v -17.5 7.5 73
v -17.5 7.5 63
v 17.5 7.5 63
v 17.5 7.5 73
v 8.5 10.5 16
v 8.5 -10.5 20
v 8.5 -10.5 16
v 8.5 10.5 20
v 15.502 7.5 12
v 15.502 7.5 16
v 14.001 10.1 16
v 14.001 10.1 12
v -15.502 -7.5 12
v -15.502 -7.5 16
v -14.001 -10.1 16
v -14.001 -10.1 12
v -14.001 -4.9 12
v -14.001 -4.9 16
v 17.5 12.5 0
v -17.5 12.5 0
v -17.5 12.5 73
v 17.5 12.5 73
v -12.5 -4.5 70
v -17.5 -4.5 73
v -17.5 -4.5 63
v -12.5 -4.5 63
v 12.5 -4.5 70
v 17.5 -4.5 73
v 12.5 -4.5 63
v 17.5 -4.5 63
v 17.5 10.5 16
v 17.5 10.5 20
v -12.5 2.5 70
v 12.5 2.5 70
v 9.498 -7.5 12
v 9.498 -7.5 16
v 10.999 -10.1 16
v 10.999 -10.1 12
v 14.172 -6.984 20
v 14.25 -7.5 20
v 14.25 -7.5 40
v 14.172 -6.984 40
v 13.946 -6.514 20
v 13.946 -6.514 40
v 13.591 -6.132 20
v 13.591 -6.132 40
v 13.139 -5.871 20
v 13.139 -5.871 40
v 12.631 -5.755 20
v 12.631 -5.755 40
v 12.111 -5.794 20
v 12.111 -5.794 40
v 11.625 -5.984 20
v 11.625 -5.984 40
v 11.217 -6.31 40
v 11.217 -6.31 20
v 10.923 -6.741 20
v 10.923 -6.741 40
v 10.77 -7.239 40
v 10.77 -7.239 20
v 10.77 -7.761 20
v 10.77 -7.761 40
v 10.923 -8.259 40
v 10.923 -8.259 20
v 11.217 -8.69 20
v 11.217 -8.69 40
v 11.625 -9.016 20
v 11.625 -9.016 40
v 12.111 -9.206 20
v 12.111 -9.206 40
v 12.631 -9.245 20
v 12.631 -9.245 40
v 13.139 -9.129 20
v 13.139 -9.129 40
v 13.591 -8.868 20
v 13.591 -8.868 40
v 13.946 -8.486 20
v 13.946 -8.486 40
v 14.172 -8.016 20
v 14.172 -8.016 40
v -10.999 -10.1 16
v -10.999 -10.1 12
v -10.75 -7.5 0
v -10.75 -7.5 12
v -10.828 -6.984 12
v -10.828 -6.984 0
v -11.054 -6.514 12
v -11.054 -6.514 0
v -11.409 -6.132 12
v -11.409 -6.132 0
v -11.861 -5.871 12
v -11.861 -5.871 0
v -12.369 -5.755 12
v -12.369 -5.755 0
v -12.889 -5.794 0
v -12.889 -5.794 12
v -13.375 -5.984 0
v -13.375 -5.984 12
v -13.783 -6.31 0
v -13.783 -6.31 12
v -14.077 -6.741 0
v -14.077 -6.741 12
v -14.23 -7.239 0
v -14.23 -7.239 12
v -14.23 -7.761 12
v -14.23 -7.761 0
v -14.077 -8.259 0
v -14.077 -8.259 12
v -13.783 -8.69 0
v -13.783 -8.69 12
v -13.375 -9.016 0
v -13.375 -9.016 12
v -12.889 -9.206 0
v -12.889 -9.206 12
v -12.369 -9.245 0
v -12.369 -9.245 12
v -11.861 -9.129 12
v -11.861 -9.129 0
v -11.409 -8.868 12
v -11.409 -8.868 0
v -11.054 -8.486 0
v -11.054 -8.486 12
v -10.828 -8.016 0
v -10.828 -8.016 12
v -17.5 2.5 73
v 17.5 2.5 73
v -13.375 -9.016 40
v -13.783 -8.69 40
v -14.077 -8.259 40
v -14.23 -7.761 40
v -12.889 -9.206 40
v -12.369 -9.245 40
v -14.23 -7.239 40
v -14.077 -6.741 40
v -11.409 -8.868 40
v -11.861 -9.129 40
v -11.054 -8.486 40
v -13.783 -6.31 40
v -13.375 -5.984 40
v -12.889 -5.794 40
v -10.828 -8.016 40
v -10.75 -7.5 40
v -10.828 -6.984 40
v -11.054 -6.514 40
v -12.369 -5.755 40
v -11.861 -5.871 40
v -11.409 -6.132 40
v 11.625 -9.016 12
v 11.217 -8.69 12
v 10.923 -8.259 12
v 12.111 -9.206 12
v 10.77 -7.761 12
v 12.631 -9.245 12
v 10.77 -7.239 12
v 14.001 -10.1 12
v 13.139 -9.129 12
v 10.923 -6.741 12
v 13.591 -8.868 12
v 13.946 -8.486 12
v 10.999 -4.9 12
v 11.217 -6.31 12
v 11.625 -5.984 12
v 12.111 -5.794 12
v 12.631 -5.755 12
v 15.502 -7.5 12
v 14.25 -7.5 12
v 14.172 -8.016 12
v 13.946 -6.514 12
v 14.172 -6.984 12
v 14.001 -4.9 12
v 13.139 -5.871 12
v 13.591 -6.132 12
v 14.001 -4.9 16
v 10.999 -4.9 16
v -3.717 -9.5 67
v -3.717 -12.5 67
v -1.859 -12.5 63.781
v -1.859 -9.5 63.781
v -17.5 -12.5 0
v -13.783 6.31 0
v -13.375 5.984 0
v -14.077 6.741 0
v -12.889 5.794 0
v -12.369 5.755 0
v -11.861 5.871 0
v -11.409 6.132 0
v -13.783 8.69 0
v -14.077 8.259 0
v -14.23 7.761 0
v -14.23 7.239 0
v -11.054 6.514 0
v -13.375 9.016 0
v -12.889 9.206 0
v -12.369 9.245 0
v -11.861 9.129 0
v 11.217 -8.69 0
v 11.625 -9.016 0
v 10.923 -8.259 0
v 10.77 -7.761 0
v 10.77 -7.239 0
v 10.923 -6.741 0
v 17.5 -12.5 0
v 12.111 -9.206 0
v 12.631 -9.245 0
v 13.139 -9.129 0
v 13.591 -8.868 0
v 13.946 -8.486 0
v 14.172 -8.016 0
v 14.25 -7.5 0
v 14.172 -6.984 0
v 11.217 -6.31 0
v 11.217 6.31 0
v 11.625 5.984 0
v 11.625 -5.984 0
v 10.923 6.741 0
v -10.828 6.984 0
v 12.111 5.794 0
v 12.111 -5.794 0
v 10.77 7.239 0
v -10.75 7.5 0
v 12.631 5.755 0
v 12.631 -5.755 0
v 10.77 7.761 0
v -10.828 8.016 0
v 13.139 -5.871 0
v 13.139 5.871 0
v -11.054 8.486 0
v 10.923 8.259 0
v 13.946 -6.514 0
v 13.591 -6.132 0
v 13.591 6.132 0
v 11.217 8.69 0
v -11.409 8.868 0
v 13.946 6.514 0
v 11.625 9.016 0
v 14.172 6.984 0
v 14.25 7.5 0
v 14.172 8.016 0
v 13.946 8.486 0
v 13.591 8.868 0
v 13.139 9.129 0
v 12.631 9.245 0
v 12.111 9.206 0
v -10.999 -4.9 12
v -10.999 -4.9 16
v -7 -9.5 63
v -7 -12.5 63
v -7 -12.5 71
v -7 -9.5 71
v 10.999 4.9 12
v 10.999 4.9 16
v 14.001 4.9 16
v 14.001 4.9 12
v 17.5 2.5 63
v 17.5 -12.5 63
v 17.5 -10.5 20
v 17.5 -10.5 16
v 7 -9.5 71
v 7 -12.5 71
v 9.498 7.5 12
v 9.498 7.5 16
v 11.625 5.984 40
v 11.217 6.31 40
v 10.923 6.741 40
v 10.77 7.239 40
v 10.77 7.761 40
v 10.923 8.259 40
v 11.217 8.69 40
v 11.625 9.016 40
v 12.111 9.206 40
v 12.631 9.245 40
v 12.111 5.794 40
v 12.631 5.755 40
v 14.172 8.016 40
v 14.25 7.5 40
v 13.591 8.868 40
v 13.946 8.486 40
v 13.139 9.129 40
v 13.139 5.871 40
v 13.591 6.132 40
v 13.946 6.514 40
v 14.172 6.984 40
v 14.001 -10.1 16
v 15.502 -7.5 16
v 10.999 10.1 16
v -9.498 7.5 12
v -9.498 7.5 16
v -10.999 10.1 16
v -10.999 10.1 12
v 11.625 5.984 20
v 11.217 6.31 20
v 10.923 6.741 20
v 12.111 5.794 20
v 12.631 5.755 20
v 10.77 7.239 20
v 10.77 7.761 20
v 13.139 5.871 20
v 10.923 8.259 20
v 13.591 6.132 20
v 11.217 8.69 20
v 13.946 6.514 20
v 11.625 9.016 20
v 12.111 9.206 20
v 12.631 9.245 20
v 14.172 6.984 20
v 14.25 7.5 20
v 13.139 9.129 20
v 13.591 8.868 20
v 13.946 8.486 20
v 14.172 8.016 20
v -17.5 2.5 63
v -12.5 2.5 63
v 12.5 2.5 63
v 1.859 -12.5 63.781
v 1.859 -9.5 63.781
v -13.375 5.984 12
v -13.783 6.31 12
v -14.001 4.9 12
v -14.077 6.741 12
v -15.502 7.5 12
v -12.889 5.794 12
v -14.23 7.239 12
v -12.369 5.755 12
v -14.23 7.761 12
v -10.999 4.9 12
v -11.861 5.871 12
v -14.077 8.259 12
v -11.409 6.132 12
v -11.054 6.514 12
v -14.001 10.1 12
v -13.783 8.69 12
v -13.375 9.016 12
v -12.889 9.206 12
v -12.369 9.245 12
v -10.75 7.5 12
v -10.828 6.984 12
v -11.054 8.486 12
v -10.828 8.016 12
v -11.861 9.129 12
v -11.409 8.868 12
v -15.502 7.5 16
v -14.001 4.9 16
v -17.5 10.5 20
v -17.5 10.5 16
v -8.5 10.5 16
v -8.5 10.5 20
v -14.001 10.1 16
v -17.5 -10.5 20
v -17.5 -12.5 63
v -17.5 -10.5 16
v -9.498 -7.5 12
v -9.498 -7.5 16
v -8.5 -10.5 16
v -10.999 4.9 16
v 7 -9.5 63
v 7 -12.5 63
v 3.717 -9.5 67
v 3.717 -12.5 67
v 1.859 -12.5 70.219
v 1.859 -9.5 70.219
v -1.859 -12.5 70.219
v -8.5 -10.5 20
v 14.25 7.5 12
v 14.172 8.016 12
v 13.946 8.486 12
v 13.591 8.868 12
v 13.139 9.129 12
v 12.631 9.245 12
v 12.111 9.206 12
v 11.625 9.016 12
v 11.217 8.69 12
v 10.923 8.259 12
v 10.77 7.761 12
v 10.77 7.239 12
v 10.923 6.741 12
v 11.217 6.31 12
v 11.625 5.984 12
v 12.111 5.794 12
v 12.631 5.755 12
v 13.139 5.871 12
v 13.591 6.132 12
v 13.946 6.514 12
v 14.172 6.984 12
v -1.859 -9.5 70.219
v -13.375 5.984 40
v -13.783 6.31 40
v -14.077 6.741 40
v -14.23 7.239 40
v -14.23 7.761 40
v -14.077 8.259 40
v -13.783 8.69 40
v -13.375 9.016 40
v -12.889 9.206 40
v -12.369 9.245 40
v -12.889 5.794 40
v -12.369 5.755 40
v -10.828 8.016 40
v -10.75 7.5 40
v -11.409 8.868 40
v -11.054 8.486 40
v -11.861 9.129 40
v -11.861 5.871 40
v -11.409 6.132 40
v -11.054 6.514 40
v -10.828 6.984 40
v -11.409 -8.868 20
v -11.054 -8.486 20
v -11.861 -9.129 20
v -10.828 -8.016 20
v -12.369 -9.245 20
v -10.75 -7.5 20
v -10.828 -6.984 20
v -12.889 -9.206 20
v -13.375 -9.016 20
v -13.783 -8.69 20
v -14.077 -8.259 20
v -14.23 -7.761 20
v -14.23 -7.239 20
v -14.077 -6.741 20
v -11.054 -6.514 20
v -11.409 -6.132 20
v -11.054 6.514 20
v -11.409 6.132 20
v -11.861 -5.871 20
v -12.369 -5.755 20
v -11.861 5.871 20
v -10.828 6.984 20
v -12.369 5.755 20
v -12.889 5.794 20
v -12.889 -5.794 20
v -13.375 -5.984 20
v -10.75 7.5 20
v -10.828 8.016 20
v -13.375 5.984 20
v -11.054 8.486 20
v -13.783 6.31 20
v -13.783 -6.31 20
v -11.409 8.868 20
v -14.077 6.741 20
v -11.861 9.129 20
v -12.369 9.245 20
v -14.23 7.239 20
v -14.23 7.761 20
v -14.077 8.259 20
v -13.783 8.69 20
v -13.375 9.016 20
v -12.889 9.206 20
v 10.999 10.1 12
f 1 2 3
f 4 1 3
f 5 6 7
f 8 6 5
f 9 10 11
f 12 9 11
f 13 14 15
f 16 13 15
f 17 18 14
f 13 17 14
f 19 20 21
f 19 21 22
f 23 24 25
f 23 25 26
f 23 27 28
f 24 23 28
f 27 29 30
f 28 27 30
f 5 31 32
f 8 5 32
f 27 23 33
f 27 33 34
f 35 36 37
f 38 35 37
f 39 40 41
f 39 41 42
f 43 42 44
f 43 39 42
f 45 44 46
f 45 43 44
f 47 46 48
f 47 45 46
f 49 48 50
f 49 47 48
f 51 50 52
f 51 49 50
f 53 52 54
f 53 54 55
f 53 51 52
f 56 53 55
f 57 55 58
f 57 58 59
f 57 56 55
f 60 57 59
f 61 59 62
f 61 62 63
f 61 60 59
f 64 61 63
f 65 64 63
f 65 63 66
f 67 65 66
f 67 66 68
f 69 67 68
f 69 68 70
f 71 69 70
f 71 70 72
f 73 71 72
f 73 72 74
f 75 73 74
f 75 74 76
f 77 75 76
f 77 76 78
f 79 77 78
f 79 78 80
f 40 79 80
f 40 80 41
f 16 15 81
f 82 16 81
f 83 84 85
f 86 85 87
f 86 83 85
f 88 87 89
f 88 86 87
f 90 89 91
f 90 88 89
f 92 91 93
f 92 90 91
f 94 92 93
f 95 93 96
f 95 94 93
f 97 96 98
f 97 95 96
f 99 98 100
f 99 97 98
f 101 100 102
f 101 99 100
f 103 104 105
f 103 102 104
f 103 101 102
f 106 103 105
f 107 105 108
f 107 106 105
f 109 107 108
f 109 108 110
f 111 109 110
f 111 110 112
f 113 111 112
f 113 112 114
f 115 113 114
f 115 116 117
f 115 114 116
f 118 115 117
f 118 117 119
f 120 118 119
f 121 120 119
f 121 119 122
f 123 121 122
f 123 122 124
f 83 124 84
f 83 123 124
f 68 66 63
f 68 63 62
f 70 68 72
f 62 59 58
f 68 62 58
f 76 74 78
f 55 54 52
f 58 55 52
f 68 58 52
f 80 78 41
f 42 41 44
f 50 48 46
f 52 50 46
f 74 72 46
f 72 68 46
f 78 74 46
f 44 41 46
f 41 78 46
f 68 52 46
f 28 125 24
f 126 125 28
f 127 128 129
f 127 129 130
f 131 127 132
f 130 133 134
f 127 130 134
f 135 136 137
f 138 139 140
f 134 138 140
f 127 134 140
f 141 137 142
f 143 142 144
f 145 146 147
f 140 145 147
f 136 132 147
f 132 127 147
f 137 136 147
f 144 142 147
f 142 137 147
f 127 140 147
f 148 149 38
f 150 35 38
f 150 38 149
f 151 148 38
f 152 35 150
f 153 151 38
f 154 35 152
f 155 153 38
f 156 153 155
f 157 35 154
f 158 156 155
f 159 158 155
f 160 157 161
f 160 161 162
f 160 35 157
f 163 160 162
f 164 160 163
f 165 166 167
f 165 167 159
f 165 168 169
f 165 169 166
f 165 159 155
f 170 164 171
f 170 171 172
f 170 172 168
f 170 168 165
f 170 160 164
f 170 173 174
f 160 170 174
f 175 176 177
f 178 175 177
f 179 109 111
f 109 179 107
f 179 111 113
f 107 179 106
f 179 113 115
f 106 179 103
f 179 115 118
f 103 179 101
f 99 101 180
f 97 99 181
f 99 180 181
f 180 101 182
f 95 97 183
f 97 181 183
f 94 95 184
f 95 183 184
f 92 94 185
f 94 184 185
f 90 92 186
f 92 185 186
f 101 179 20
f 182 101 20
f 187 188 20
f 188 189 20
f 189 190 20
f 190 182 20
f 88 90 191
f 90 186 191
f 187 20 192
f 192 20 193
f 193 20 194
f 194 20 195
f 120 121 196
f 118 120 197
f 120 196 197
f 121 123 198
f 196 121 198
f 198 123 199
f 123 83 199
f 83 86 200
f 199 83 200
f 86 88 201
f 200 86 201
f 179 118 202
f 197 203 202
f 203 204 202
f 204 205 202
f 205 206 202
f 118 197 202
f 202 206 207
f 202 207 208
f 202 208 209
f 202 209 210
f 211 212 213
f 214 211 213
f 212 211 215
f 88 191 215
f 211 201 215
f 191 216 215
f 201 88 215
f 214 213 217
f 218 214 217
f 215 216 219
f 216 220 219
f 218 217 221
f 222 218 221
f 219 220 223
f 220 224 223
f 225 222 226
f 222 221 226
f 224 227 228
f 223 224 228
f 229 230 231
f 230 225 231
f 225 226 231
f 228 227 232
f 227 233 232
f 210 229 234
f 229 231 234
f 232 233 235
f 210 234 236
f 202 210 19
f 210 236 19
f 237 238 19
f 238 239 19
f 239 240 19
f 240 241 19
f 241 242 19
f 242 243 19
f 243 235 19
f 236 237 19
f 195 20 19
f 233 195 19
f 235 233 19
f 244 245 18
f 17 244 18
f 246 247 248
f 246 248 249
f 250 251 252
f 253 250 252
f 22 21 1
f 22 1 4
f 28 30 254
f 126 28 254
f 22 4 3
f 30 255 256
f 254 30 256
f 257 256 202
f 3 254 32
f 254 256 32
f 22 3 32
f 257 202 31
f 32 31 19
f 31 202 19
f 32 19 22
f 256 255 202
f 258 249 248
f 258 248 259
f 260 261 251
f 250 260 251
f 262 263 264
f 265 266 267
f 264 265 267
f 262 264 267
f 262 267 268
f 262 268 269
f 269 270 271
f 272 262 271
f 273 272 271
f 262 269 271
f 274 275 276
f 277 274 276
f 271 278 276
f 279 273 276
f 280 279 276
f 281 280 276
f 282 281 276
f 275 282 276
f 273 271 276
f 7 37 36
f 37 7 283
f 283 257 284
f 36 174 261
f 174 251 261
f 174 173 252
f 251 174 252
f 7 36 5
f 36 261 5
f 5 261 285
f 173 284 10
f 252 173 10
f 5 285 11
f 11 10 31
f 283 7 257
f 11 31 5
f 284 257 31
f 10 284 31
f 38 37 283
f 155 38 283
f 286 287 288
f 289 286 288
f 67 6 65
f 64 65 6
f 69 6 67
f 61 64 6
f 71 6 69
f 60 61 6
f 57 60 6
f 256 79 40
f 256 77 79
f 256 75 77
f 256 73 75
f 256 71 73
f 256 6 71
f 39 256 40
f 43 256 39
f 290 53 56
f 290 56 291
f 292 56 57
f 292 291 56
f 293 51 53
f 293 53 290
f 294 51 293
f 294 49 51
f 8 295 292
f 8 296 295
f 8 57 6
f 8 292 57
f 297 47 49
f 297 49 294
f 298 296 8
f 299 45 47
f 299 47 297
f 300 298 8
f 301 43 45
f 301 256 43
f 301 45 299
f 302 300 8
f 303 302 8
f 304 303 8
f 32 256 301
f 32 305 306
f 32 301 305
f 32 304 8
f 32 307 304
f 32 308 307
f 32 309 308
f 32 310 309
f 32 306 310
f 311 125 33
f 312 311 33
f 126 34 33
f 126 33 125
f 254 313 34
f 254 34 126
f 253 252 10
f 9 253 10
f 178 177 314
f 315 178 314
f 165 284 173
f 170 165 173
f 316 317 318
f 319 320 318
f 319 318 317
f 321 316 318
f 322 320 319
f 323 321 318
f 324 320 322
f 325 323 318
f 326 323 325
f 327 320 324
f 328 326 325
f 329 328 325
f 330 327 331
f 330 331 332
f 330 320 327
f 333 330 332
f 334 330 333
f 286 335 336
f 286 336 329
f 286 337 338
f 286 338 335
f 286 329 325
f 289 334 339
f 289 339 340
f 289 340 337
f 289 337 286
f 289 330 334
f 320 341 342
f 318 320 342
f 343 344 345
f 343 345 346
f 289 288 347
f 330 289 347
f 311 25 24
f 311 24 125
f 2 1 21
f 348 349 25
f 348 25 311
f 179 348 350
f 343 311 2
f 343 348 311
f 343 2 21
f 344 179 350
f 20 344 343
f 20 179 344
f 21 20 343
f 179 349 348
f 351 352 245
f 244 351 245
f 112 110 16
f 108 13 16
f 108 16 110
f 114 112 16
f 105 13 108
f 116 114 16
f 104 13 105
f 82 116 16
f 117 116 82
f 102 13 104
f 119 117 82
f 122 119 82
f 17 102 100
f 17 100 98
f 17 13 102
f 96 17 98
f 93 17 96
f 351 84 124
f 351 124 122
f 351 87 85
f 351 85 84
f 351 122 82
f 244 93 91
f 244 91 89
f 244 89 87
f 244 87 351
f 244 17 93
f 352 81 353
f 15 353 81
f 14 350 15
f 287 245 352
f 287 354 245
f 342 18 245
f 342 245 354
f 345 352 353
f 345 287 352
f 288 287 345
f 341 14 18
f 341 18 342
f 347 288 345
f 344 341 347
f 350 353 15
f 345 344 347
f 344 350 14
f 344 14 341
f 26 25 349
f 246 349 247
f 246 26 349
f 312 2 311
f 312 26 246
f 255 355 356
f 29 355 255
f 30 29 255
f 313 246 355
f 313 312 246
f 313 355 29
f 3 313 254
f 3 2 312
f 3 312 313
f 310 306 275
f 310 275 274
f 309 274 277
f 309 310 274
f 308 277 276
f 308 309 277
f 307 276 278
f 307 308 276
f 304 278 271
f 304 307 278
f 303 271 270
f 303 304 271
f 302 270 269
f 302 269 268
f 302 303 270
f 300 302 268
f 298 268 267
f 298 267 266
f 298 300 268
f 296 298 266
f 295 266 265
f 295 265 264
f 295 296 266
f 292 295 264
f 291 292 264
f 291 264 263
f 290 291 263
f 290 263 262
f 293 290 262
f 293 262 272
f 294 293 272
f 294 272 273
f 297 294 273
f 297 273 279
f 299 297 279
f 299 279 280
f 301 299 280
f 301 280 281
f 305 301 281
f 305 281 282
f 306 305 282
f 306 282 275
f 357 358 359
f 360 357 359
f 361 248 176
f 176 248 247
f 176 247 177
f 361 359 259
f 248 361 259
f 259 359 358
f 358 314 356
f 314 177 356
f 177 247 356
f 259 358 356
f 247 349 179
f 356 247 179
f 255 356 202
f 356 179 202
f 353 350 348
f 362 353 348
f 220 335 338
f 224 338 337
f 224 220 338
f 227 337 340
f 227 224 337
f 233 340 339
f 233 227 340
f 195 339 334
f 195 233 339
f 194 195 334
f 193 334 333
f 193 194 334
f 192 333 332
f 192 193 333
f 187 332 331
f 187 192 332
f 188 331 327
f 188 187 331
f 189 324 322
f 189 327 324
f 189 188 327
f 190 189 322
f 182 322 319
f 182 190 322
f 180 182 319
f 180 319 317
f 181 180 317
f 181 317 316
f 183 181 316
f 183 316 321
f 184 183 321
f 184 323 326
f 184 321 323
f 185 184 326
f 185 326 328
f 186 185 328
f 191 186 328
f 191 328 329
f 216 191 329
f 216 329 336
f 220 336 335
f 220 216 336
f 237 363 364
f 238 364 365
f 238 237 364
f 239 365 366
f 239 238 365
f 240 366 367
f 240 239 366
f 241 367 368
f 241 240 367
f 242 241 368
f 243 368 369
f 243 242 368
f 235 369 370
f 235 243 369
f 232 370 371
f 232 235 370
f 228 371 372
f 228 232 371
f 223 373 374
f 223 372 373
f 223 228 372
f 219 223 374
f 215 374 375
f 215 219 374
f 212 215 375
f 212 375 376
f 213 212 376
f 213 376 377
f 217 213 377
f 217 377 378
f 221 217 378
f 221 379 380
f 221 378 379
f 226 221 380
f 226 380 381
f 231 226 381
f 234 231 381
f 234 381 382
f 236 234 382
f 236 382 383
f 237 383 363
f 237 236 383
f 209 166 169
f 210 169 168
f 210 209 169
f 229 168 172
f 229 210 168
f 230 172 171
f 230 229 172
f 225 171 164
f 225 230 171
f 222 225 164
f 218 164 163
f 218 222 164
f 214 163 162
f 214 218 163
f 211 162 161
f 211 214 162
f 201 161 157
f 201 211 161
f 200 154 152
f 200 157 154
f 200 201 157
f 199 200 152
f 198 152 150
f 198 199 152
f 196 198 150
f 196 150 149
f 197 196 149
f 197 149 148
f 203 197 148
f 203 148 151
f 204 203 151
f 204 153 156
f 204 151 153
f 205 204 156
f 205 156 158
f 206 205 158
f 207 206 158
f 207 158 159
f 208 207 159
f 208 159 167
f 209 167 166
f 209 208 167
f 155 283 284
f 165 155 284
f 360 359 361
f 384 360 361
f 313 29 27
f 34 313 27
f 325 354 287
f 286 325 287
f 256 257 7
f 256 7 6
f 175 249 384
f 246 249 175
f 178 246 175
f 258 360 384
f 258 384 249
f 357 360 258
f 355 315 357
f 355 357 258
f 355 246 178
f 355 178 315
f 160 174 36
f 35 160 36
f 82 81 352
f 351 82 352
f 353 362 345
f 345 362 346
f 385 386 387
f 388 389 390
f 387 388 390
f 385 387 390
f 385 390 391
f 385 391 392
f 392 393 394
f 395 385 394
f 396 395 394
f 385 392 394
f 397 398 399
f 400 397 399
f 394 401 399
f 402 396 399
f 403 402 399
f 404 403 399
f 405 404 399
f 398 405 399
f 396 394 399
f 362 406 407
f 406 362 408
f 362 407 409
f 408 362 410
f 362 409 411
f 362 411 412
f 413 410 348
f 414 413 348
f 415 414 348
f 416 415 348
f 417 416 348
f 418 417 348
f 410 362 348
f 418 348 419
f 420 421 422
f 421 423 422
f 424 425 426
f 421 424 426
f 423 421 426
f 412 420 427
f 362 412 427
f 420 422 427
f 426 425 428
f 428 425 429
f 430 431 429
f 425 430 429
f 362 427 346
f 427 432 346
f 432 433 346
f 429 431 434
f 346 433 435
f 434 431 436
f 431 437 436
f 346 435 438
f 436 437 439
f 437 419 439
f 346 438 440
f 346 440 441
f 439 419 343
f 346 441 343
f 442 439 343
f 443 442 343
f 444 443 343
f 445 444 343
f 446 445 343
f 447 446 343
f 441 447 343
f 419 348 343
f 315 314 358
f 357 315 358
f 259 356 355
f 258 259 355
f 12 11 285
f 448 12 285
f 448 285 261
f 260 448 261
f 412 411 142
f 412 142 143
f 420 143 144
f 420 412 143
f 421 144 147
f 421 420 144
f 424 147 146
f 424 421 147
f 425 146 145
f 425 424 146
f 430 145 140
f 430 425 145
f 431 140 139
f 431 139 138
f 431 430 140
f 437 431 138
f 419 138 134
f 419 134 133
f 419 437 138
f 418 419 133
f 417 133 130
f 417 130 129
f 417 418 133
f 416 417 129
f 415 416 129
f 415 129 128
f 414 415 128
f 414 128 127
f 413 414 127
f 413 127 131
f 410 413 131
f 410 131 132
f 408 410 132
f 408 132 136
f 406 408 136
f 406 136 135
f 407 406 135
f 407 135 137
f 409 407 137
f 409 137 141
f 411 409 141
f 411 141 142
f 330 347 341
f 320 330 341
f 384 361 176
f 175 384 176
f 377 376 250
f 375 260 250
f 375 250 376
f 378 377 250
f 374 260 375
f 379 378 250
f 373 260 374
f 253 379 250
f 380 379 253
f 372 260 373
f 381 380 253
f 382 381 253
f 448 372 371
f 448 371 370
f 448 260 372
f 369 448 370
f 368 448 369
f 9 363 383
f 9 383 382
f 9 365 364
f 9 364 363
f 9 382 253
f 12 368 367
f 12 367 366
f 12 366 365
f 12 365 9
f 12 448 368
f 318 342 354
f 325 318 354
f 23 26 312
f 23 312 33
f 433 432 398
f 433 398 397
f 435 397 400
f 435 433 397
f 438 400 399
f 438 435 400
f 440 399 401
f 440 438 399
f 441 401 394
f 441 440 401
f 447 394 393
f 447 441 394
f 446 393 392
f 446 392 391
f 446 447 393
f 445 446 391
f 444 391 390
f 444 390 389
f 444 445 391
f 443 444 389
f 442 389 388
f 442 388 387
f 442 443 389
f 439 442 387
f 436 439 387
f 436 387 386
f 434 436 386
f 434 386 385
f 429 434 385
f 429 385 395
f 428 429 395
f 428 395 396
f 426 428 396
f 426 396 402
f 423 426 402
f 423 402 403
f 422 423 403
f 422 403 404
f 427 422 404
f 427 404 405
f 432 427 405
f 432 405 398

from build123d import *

# Parameters (mm, degrees)
F0_W      = 35
F0_H      = 25
F0_R      = 1.75
F1_DEPTH  = 40
F2_W      = 35
F2_H      = 25
F3_DEPTH  = 23
F4_W      = 35
F4_H      = 5
F5_DEPTH  = 10
F6_W      = 35
F6_H      = 7
F7_DEPTH  = 10
F8_W      = 25
F8_H      = 7
F9_DEPTH  = 7
F10_W     = 14
F10_H     = 3
F11_DEPTH = 8
F15_DEPTH = 8
F16_W     = 21
F16_H     = 4
F17_DEPTH = 9
F18_DEPTH = 3


# Not quite as in the source:
# - a pattern or mirror of a feature is missing from the dataset's text; its kind, count and spacing are read off the source's solid


with BuildPart() as f1:
    # F0 (on Top) → F1 (new body)
    with BuildSketch(Plane.XY):
        Rectangle(F0_W, F0_H)
        with Locations((-12.5, -7.5)):
            Circle(F0_R, mode=Mode.SUBTRACT)
        with Locations((12.5, -7.5)):
            Circle(F0_R, mode=Mode.SUBTRACT)
        with Locations((-12.5, 7.5)):
            Circle(F0_R, mode=Mode.SUBTRACT)
        with Locations((12.5, 7.5)):
            Circle(F0_R, mode=Mode.SUBTRACT)
    extrude(amount=F1_DEPTH)

    # F2 (on face) → F3 (join)
    with BuildSketch(Plane.XY.offset(40)):
        Rectangle(F2_W, F2_H)
    extrude(amount=F3_DEPTH)

    # F4 (on face) → F5 (join)
    with BuildSketch(Plane.XY.offset(63)):
        with Locations((0, 10)):
            Rectangle(F4_W, F4_H)
    extrude(amount=F5_DEPTH)

    # F6 (on face) → F7 (join)
    with BuildSketch(Plane.XY.offset(63)):
        with Locations((0, -1)):
            Rectangle(F6_W, F6_H)
    extrude(amount=F7_DEPTH)

    # F8 (on face) → F9 (cut)
    with BuildSketch(Plane.XZ.offset(4.5)):
        with Locations((0, 66.5)):
            Rectangle(F8_W, F8_H)
    extrude(amount=-F9_DEPTH, mode=Mode.SUBTRACT)

    # F10 (on face) → F11 (join)
    with BuildSketch(Plane.XY.offset(63)):
        with Locations((0, -11)):
            Rectangle(F10_W, F10_H)
    extrude(amount=F11_DEPTH)

    # F14 (on offset) → F15 (cut)
    with BuildSketch(Plane.XY.offset(20)):
        Polygon((14.0011106999, -10.1), (15.5022213998, -7.5), (14.0011106999, -4.9), (10.9988893001, -4.9), (9.4977786002, -7.5), (10.9988893001, -10.1), align=None)
        Polygon((10.9988893001, 10.1), (9.4977786002, 7.5), (10.9988893001, 4.9), (14.0011106999, 4.9), (15.5022213998, 7.5), (14.0011106999, 10.1), align=None)
        Polygon((-10.9988893001, 4.9), (-9.4977786002, 7.5), (-10.9988893001, 10.1), (-14.0011106999, 10.1), (-15.5022213998, 7.5), (-14.0011106999, 4.9), align=None)
        Polygon((-14.0011106999, -10.1), (-10.9988893001, -10.1), (-9.4977786002, -7.5), (-10.9988893001, -4.9), (-14.0011106999, -4.9), (-15.5022213998, -7.5), align=None)
    extrude(amount=-F15_DEPTH, mode=Mode.SUBTRACT)

    # F16 (on face) → F17 (cut)
    with BuildSketch(Plane.YZ.offset(17.5)):
        with Locations((0, 18)):
            Rectangle(F16_W, F16_H)
    f17 = extrude(amount=-F17_DEPTH, mode=Mode.SUBTRACT)

    # F17_copies: F17 across plane
    add(f17.mirror(Plane(origin=(0, 0, 0), x_dir=(0, 0, -1), z_dir=(-1, 0, 0))), mode=Mode.SUBTRACT)

    # F12 (on face) → F18 (cut)
    with BuildSketch(Plane.XZ.offset(12.5)):
        Polygon((3.7173565517, 67), (1.8586782759, 70.2193252087), (-1.8586782759, 70.2193252087), (-3.7173565517, 67), (-1.8586782759, 63.7806747913), (1.8586782759, 63.7806747913), align=None)
    extrude(amount=-F18_DEPTH, mode=Mode.SUBTRACT)


solid = f1.part
